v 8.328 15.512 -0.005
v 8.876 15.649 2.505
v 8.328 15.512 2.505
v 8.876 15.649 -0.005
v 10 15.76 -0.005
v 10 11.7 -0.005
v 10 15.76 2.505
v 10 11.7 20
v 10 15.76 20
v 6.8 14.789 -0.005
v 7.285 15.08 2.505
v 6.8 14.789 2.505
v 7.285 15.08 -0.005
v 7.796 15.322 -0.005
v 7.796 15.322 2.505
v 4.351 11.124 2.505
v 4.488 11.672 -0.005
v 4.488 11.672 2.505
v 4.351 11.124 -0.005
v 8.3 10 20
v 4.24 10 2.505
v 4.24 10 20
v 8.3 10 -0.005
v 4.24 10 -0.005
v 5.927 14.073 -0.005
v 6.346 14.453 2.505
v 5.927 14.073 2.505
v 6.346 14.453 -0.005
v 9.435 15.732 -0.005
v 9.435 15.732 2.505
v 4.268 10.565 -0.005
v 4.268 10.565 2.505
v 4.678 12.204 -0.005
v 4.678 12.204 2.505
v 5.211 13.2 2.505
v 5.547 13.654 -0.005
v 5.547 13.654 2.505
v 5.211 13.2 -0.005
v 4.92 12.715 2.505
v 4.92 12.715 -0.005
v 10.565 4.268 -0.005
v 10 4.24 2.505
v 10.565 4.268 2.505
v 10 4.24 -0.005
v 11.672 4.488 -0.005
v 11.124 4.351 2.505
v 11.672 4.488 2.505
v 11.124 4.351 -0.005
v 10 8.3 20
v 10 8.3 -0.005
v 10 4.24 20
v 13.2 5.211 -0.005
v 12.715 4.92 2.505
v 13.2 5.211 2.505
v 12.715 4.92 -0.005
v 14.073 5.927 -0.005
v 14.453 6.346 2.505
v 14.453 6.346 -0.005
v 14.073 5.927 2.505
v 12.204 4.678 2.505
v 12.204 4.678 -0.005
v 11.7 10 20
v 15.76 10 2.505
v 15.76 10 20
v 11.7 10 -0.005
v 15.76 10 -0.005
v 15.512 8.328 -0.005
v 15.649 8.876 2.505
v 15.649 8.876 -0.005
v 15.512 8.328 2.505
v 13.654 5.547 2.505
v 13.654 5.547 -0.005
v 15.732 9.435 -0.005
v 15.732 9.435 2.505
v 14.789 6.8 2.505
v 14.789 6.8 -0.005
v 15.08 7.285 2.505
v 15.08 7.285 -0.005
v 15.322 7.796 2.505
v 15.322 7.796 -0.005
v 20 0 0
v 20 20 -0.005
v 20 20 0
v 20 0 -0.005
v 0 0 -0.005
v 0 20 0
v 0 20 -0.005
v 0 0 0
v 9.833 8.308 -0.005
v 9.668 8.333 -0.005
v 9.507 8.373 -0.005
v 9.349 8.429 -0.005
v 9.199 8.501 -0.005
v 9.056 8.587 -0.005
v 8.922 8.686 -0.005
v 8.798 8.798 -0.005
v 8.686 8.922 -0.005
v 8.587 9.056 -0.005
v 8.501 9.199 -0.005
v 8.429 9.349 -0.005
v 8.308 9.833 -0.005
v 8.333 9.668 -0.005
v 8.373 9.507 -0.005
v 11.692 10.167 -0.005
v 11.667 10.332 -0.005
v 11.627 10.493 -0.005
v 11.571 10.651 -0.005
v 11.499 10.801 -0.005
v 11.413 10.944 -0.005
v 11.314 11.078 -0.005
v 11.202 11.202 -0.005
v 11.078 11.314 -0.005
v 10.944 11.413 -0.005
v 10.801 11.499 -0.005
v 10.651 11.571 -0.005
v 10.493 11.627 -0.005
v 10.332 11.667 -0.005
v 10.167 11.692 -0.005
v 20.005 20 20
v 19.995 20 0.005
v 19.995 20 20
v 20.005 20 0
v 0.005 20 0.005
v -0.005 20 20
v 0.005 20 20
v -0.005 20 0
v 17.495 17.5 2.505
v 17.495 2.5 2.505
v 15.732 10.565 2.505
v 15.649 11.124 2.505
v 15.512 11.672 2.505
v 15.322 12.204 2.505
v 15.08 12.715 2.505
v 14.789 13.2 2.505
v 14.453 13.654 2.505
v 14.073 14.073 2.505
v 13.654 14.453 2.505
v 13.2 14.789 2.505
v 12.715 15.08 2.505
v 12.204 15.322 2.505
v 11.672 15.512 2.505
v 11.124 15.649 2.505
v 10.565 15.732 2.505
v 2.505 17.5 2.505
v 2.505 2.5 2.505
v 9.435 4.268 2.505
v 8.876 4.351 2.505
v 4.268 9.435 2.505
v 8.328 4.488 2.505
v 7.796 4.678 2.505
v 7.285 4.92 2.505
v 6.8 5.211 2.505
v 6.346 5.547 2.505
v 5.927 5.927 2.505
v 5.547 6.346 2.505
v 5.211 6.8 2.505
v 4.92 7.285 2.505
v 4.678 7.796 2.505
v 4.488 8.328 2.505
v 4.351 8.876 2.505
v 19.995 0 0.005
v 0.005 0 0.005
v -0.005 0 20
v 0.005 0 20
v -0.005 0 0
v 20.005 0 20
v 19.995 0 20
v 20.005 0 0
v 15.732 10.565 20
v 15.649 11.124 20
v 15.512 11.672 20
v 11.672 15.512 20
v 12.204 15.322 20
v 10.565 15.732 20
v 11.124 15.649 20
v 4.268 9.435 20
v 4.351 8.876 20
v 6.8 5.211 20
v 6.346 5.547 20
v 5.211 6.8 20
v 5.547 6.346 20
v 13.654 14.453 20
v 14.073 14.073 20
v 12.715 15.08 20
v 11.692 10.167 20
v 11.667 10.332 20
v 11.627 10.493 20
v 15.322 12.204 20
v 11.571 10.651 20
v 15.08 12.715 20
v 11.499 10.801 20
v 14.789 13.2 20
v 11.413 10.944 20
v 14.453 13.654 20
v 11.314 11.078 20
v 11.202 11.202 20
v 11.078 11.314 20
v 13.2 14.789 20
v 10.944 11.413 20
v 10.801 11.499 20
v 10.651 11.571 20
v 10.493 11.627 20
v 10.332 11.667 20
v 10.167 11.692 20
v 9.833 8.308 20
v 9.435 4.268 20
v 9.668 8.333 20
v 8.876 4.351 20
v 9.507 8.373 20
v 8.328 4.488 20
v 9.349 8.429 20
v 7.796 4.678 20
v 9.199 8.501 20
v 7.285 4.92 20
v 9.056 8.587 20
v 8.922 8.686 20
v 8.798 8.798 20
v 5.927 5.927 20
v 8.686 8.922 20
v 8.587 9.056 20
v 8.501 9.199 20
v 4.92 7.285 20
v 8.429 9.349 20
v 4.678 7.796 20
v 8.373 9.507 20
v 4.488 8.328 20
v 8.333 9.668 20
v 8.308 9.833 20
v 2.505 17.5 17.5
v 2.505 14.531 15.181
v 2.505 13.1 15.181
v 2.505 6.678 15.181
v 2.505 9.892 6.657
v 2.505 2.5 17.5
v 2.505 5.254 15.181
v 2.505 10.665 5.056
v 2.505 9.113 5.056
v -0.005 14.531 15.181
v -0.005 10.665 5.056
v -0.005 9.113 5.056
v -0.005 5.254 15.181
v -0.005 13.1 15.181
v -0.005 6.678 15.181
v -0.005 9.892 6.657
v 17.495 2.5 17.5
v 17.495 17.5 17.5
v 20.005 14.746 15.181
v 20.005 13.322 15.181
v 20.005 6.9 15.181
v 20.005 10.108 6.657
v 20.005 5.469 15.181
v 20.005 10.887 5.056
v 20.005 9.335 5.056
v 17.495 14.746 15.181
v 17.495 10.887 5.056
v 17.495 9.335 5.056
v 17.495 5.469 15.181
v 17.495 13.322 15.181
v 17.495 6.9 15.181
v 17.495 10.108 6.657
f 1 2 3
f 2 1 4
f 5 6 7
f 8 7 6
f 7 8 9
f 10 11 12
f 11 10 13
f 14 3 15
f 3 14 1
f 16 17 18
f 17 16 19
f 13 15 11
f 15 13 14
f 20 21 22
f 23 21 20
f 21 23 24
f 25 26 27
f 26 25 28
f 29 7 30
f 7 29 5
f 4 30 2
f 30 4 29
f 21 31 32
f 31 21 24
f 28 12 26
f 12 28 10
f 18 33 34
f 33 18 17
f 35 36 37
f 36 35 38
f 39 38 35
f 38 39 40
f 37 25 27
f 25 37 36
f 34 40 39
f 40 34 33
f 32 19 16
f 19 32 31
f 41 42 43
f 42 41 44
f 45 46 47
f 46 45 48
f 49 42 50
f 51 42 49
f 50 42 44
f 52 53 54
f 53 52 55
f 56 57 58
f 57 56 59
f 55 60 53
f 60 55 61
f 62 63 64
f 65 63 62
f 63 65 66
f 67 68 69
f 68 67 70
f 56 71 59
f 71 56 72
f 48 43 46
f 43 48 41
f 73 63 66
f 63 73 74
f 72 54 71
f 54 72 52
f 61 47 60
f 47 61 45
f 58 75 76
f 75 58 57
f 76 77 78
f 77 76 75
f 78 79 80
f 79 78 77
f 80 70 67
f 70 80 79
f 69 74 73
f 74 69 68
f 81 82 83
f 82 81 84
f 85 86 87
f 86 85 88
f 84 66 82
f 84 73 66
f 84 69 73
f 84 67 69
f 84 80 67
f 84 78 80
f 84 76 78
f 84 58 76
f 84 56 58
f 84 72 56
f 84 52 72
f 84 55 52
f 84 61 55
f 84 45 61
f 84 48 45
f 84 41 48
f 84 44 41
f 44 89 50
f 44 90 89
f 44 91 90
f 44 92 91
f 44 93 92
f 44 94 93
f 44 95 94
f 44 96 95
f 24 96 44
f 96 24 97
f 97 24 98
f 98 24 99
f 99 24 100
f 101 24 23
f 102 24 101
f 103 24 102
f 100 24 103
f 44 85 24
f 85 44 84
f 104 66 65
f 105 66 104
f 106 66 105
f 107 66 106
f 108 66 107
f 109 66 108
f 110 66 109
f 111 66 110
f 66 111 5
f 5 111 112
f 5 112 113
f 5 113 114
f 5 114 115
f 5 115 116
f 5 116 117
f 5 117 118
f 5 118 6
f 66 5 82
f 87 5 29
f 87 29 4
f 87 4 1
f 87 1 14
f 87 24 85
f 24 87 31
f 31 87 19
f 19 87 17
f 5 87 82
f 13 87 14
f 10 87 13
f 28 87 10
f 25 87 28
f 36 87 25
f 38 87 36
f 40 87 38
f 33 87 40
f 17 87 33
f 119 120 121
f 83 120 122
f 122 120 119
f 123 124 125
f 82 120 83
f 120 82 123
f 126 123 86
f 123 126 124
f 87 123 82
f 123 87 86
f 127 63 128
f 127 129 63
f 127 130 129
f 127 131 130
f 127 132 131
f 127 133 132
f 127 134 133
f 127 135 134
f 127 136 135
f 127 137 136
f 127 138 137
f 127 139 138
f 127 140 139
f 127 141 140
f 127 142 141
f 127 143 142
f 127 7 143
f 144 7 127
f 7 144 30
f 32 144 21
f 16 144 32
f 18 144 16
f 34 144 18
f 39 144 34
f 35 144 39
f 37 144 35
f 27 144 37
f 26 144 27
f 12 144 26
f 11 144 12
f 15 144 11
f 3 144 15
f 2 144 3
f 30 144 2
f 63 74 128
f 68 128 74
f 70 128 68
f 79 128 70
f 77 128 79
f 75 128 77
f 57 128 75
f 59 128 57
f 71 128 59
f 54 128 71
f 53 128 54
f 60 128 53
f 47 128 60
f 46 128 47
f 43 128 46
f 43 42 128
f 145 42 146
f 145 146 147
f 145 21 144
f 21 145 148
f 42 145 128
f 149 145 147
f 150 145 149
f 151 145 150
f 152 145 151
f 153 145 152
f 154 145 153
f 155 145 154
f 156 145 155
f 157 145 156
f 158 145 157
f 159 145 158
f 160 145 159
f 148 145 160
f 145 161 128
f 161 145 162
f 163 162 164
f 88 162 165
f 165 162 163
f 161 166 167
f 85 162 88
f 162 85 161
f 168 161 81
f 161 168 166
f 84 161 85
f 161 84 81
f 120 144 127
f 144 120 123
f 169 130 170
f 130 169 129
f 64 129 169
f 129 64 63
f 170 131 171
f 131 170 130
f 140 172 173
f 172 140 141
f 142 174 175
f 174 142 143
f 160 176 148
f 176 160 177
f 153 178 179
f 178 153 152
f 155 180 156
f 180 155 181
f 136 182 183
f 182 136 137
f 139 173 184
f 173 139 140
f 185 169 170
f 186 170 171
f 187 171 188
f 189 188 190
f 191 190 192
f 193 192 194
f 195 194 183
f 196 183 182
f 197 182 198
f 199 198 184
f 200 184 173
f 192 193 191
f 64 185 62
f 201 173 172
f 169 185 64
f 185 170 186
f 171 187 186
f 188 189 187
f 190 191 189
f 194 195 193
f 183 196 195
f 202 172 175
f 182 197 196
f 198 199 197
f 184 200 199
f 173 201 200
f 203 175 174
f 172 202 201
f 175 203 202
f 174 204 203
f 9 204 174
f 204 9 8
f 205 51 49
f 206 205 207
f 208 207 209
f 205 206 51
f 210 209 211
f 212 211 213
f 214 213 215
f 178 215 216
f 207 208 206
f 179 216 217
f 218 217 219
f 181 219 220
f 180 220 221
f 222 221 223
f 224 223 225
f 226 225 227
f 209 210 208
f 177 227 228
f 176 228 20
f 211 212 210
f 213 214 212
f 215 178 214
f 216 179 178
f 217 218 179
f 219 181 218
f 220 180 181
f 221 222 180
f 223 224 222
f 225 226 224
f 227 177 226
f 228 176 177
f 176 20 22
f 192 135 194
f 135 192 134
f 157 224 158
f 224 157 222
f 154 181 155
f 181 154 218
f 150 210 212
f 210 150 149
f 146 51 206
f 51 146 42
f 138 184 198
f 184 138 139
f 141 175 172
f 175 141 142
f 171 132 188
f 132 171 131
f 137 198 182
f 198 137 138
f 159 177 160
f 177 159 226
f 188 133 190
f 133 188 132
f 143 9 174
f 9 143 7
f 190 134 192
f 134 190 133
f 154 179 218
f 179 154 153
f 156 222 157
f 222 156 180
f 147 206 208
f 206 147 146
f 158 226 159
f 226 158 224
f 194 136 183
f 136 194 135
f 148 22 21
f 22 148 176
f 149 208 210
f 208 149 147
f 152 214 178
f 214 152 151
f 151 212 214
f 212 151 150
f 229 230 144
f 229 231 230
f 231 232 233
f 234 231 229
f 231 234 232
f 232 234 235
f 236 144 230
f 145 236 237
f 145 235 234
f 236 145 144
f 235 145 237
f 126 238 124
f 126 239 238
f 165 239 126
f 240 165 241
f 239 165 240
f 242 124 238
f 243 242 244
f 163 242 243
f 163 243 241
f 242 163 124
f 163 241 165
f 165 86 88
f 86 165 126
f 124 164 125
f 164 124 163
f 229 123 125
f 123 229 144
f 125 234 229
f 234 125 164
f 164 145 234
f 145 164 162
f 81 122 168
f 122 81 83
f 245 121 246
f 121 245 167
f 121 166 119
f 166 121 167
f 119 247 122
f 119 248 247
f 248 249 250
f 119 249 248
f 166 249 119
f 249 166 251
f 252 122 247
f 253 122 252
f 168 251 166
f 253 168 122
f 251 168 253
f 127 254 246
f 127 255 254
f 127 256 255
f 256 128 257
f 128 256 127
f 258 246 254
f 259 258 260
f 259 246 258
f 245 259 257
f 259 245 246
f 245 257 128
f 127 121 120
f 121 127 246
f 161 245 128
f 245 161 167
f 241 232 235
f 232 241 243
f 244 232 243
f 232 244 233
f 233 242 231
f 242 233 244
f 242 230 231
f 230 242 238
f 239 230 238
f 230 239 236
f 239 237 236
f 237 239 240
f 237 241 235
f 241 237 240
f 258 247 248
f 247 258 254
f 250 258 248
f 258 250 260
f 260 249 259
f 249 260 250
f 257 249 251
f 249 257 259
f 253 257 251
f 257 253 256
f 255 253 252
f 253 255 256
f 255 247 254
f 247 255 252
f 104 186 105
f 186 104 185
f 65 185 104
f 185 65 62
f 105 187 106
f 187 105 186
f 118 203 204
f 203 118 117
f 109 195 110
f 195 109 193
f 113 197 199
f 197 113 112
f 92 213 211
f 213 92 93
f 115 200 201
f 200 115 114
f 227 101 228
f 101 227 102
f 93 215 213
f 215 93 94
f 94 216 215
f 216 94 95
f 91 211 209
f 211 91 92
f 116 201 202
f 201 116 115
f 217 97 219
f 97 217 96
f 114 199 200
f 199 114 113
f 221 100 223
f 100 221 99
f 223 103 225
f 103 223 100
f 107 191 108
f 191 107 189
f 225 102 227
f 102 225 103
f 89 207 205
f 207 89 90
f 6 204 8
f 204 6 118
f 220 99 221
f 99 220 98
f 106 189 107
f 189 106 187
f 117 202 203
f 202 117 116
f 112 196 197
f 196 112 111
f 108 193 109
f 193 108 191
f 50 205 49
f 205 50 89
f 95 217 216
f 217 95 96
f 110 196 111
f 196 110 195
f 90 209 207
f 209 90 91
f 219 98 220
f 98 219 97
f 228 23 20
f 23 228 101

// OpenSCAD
// half_cube.scad - Parametric Half-Cube with Snap-Fit Mechanism
// Research-faithful implementation: Dual-U topology, snap locks, mitered walls
// Units: mm

$fn = 64;

// --- Parameters ---
size = 20.0;          // Outer cube dimension
thick = 2.5;          // Wall thickness
rod_D = 3.0;          // Rod diameter
clearance = 0.2;      // Clearance for rod bore
fit_clear = 0;        // Miter face clearance (zeroed; kept for future use)

// --- Visibility Toggles ---
show_base = true;
show_walls = true;
show_mech = true;
show_letter = true;

// --- Advanced Visibility (sub-component toggles) ---
show_wall_left = true;
show_wall_right = true;
show_mech_base_ring = true;
show_mech_pillars = true;
show_mech_snap_beams = true;

// --- Flip Mode (for top unit) ---
is_flipped = false;        // true = top unit (rotated mechanism, inverted letter)

// --- Letter Parameters ---
letter_bottom = "V";
letter_top = "F";
letter = is_flipped ? letter_top : letter_bottom;
letter_emboss = false;     // true = raised, false = carved
letter_depth = 0.5;
letter_size = 10;

// --- Snap-Fit Parameters (scaled from research: 60mm -> size) ---
scale_factor = size / 60;
snap_beam_len   = max(6.0 * scale_factor, 1.5);  // Cantilever beam length
snap_beam_width = max(3.0 * scale_factor, 0.8);   // Beam width
snap_beam_thick = max(1.2 * scale_factor, 0.4);   // Beam thickness
snap_undercut   = max(0.6 * scale_factor, 0.15);   // Undercut depth on snap head
snap_head_len   = max(1.5 * scale_factor, 0.4);    // Length of snap head
snap_relief_w   = max(1.5 * scale_factor, 0.3);    // Relief slot width
snap_relief_d   = max(0.8 * scale_factor, 0.2);    // Relief slot depth into head
snap_sink       = max(size * 0.03, 0.3);               // Head sunk into shaft for boolean union (increased for robust CGAL merge)

// Derived
cyl_R_base = rod_D/2 + clearance;
cyl_R = cyl_R_base + (size/2 - thick - cyl_R_base) * 0.7;  // Adaptive to available space
cyl_H = size - thick - fit_clear;

// Weld cube size for mesh integrity at internal junctions
weld = max(size * 0.02, 0.15);

// --- Main Assembly ---
module assembly(
    flipped=is_flipped,
    v_base=show_base, v_walls=show_walls, v_mech=show_mech, v_letter=show_letter,
    v_wall_left=show_wall_left, v_wall_right=show_wall_right,
    v_mech_base_ring=show_mech_base_ring,
    v_mech_pillars=show_mech_pillars,
    v_mech_snap_beams=show_mech_snap_beams
) {
    difference() {
        union() {
            // 1. Base Plate
            if (v_base)
                translate([size/2, size/2, thick/2])
                    base_plate(flipped=flipped);

            // 2. Side Walls with full mitered edges (top + front/back)
            if (v_walls && v_wall_left)
                translate([thick/2, size/2, size/2])
                    mitered_wall();
            if (v_walls && v_wall_right)
                translate([size - thick/2, size/2, size/2])
                    mirror([1,0,0]) mitered_wall();

            // 3. Central mechanism with snap-fit
            if (v_mech)
                translate([size/2, size/2, 0])
                    mechanism_pillars(flipped=flipped,
                        v_base_ring=v_mech_base_ring,
                        v_pillars=v_mech_pillars,
                        v_snap_beams=v_mech_snap_beams);

            // 4. Letters on BOTH walls (embossed mode)
            if (v_letter && letter_emboss) {
                letter_geometry(flipped=flipped, side="left");
                letter_geometry(flipped=flipped, side="right");
            }
        }

        // Global subtractions
        // Rod bore through center
        translate([size/2, size/2, size/2])
            cylinder(r=rod_D/2 + clearance, h=size*2, center=true);

        // Letters carved on BOTH walls
        if (v_letter && !letter_emboss) {
            letter_geometry(flipped=flipped, side="left");
            letter_geometry(flipped=flipped, side="right");
        }
    }
}

// --- Base Plate ---
// Frustum floor: wider on outer (bottom) face, tapered on inner (top) face
// Quarter-circle perforations for opposing mechanism pass-through
module base_plate(flipped=false) {
    // Bottom half (flipped=false): opposing pillars are at Q2/Q4 (angles 90, 270)
    // Top half (flipped=true): opposing pillars are at Q1/Q3 (angles 0, 180)
    perf_base = flipped ? 0 : 90;
    taper = thick;  // 45° slope: taper equals thickness (rise = run)
    side = size - 2*fit_clear;

    difference() {
        // Frustum: hull between larger outer (bottom) face and smaller inner (top) face
        hull() {
            // Outer face (bottom, z = -thick/2)
            translate([0, 0, -thick/2])
                cube([side, side, 0.01], center=true);
            // Inner face (top, z = +thick/2), inset by taper on XY edges
            translate([0, 0, thick/2])
                cube([side - 2*taper, side - 2*taper, 0.01], center=true);
        }

        // Pillar-shaped perforations for opposing mechanism (pie-slice matching cyl_R)
        for (angle = [perf_base, perf_base + 180])
            rotate([0, 0, angle])
                linear_extrude(thick * 2 + 1, center=true)
                    intersection() {
                        circle(r=cyl_R);
                        polygon([[0,0], [size,0], [0,size]]);
                    }
    }
}

// --- Mitered Wall ---
// Full-height wall as truncated pyramid (frustum): wider outer face, tapered inner face
// Improves interlocking between mating half-cubes
module mitered_wall() {
    wall_length = size - 2*fit_clear;  // Y dimension
    taper = thick;                      // 45° slope: taper equals thickness (rise = run)

    difference() {
        // Frustum: hull between larger outer face and smaller inner face
        hull() {
            // Outer face (at x = -thick/2)
            translate([-thick/2, 0, 0])
                cube([0.01, wall_length, size - fit_clear], center=true);
            // Inner face (at x = +thick/2), smaller by taper on each edge
            translate([thick/2, 0, -taper/2])
                cube([0.01, wall_length - 2*taper, size - fit_clear - taper], center=true);
        }

    }
}

// --- Letter Geometry ---
// Places letter on specified wall exterior
// Both left and right walls get letters
module letter_geometry(flipped=is_flipped, side="left") {
    local_letter = flipped ? letter_top : letter_bottom;
    flip_angle = flipped ? 180 : 0;
    letter_z = size/2;  // Center of cube (full-height walls)

    // Extrusion must penetrate the full frustum wall plus margin
    letter_extrude = letter_depth + (letter_emboss ? 0 : thick + 1);

    if (side == "left") {
        wall_x = -0.5;  // Start outside the wall to ensure full cut-through
        translate([wall_x, size/2, letter_z])
            rotate([90, flip_angle, 90])
                scale([-1, 1, 1])
                    linear_extrude(letter_extrude)
                        text(local_letter, size=letter_size, halign="center", valign="center",
                             font="Allerta Stencil:style=Regular");
    } else {
        // Right wall: mirror placement
        wall_x = size + 0.5;  // Start outside the wall to ensure full cut-through
        translate([wall_x, size/2, letter_z])
            rotate([90, flip_angle, -90])
                scale([-1, 1, 1])
                    linear_extrude(letter_extrude)
                        text(local_letter, size=letter_size, halign="center", valign="center",
                             font="Allerta Stencil:style=Regular");
    }
}

// --- Mechanism Pillars with Snap-Fit ---
// Two opposing quadrant pillars with base ring, snap beams, and weld cubes
module mechanism_pillars(flipped=is_flipped,
    v_base_ring=true, v_pillars=true, v_snap_beams=true
) {
    base_ring_h = thick + max(size * 0.005, 0.05);
    pillar_height = size;

    mech_rotation = flipped ? 90 : 0;

    rotate([0, 0, mech_rotation])
    union() {
        // 1. Pillars with wedge cuts (no base ring)
        if (v_pillars)
            translate([0, 0, 0])
                difference() {
                    cylinder(r=cyl_R, h=pillar_height);

                    // Cut away Q2 and Q4 (90° and 270°)
                    rotate([0, 0, 90])
                        wedge_cutter(pillar_height + 1);
                    rotate([0, 0, 270])
                        wedge_cutter(pillar_height + 1);
                }

        // 4. Snap-fit cantilever beams on pillar faces
        //    Angles inset 10° from quadrant boundaries to ensure beam roots
        //    are fully within pillar material (Q1: 0°–90°, Q3: 180°–270°)
        if (v_snap_beams) {
            // Q1 pillar: beam on +Y face (near 90° boundary)
            translate([0, 0, 0])
                snap_beam_at(angle=80, pillar_height=pillar_height);

            // Q1 pillar: beam on +X face (near 0° boundary)
            translate([0, 0, 0])
                snap_beam_at(angle=10, pillar_height=pillar_height);

            // Q3 pillar: beam on -X face (near 180° boundary)
            translate([0, 0, 0])
                snap_beam_at(angle=190, pillar_height=pillar_height);

            // Q3 pillar: beam on -Y face (near 270° boundary)
            translate([0, 0, 0])
                snap_beam_at(angle=260, pillar_height=pillar_height);
        }

        // 5. Weld cubes at pillar tops for mesh integrity
        //    Placed at pillar centers (Q1=45°, Q3=225°) to avoid cut boundaries
        if (v_snap_beams)
            for (angle = [45, 225])
                rotate([0, 0, angle])
                    translate([cyl_R * 0.4, 0, pillar_height - weld/2])
                        cube(weld, center=true);
    }
}

// --- Snap Beam ---
// Cantilever beam with undercut head and relief slot
// Placed at a given angle on the cylinder surface, growing upward from mid-pillar
module snap_beam_at(angle, pillar_height) {
    beam_z_start = pillar_height * 0.3;  // Start beam at 30% up the pillar

    rotate([0, 0, angle])
    translate([cyl_R - snap_sink, 0, beam_z_start]) {
        // Cantilever beam body
        // Extends radially outward, with length along Z
        rotate([0, 0, 0])
        union() {
            // Beam shaft - tapered slightly (thicker at root)
            hull() {
                // Root (attached to pillar)
                translate([0, -snap_beam_width/2, 0])
                    cube([snap_beam_thick, snap_beam_width, 0.01]);
                // Tip (slightly thinner)
                translate([0, -snap_beam_width/2, snap_beam_len])
                    cube([snap_beam_thick * 0.85, snap_beam_width, 0.01]);
            }

            // Snap head with undercut
            translate([0, -snap_beam_width/2, snap_beam_len])
                snap_head();
        }
    }
}

// --- Snap Head ---
// Overhanging head with undercut for positive engagement
// Includes relief slot for beam flexibility
module snap_head() {
    difference() {
        // Ramped head: hull from full undercut at base to flush at tip
        // Creates ~30° lead-in chamfer for easier insertion
        hull() {
            // Base: full undercut width
            translate([-snap_undercut, 0, 0])
                cube([snap_beam_thick + snap_undercut, snap_beam_width, 0.01]);
            // Tip: no undercut (flush with beam)
            translate([0, 0, snap_head_len - 0.01])
                cube([snap_beam_thick, snap_beam_width, 0.01]);
        }

        // Relief slot through center of head for flexibility
        translate([snap_beam_thick/2 - snap_relief_d/2, (snap_beam_width - snap_relief_w)/2, -0.1])
            cube([snap_relief_d, snap_relief_w, snap_head_len + 0.2]);
    }
}

// --- Wedge Cutter ---
// 90° sector cutter for quadrant removal
module wedge_cutter(h=size) {
    linear_extrude(h)
        polygon([[0, 0], [size, 0], [0, size]]);
}

// --- Render ---
if (is_undef(is_library)) {
    assembly();
}
